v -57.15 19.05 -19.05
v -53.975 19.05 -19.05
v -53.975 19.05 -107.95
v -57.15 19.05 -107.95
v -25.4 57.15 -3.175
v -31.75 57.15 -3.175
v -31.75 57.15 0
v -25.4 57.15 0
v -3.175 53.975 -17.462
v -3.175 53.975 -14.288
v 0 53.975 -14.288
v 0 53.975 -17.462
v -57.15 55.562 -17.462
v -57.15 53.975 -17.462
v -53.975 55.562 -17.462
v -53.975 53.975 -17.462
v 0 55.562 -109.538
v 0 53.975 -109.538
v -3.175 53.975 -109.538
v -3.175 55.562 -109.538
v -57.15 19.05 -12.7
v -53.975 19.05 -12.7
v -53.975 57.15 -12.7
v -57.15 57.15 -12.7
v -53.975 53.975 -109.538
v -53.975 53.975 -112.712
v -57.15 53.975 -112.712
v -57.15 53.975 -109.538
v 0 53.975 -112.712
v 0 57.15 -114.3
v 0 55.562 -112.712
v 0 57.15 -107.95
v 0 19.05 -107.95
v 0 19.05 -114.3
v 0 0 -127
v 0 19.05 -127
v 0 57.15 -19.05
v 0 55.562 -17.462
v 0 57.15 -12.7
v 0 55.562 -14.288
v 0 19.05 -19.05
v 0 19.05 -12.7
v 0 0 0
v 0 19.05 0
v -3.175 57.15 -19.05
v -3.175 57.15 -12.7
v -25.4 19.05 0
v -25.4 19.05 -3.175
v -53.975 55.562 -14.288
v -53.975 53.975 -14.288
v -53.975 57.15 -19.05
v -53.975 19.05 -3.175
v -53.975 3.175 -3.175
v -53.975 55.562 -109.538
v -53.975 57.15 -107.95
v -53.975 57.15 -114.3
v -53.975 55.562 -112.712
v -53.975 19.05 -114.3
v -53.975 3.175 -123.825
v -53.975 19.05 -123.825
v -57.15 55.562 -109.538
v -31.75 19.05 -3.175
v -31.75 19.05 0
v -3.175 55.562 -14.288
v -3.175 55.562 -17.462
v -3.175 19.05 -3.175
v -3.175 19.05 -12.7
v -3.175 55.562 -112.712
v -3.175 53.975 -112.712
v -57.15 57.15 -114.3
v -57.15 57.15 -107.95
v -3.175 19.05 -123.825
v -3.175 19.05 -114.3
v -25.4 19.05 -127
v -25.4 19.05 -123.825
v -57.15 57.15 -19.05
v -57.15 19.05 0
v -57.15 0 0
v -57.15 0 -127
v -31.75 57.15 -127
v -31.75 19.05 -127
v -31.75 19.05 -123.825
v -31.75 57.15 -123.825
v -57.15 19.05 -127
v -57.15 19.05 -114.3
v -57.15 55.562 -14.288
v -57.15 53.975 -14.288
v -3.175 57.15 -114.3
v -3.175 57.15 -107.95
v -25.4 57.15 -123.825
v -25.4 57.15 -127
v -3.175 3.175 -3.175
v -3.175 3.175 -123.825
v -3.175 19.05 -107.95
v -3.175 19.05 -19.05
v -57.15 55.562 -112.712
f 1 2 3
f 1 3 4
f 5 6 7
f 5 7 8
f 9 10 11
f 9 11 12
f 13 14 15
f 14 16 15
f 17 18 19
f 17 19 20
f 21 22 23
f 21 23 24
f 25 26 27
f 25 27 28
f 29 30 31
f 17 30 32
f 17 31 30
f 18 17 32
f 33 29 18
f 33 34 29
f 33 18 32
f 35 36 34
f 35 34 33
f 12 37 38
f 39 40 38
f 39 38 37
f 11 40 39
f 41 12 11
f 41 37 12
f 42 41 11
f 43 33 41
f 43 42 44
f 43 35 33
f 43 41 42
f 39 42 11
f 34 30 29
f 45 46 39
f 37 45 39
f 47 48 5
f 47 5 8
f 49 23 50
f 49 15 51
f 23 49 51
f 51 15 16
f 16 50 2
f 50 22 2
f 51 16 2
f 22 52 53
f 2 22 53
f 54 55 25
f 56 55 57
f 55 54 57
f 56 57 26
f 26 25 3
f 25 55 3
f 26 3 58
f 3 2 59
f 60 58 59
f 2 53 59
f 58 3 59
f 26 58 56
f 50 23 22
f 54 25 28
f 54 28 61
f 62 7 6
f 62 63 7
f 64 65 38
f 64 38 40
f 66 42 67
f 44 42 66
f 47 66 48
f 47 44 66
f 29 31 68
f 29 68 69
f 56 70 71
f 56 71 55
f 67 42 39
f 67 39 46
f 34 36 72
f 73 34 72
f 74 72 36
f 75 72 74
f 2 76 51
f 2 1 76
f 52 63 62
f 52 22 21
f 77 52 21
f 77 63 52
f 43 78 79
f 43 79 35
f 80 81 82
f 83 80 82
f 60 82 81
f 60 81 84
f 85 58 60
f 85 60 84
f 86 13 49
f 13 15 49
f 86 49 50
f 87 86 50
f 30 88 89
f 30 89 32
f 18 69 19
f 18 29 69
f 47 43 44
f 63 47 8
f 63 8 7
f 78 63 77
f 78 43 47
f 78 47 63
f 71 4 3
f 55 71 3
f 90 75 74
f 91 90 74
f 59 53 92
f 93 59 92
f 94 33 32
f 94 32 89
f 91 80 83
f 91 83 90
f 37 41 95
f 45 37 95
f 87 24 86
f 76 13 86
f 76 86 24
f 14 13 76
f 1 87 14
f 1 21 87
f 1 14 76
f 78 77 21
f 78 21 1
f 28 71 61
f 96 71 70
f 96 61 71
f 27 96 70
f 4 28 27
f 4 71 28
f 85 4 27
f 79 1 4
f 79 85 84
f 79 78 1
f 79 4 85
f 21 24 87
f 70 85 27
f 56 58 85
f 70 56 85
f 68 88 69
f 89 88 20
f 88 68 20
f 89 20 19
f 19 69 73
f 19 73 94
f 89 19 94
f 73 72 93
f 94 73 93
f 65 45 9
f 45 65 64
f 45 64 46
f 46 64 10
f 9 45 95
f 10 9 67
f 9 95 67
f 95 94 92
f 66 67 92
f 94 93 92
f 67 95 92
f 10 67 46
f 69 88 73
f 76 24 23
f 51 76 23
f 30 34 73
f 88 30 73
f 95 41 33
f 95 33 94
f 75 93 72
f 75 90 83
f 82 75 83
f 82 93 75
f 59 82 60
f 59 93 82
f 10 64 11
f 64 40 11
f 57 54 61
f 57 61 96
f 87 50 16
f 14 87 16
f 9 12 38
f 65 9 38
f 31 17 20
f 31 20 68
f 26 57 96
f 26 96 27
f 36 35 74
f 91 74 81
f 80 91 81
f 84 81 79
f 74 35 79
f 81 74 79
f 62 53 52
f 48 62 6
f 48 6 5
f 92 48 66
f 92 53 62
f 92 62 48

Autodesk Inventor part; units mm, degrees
ref_plane "YZ Plane" through (0, 0, 0) normal (1, 0, 0) x (0, 1, 0)
ref_plane "XZ Plane" through (0, 0, 0) normal (0, 1, 0) x (-1, 0, 0)
ref_plane "XY Plane" through (0, 0, 0) normal (0, 0, 1) x (1, 0, 0)
sketch "Sketch1" plane through (0, 0, 0) normal (0, 1, 0) x (-1, 0, 0)
  line L0 (0, 0) -> (3.175, 0)
  line L1 (3.175, 0) -> (3.175, -3.175)
  line L2 (3.175, -3.175) -> (0, -3.175)
  line L3 (0, -3.175) -> (0, 0)
  line L4 (0, 0) -> (6.35, 0)
  line L5 (0, -6.35) -> (0, 0)
  line L6 (3.175, 0) -> (50.8, 0)
  line L7 (50.8, 0) -> (50.8, -3.175)
  line L8 (50.8, -3.175) -> (3.175, -3.175)
  line L9 (3.175, -3.175) -> (3.175, 0)
  line L10 (50.8, 0) -> (57.15, 0)
  line L11 (57.15, 0) -> (57.15, -6.35)
  line L12 (57.15, 0) -> (53.975, 0)
  line L13 (53.975, 0) -> (53.975, -3.175)
  line L14 (53.975, -3.175) -> (57.15, -3.175)
  line L15 (57.15, -3.175) -> (57.15, 0)
  line L16 (53.975, -120.65) -> (53.975, -123.825)
  line L17 (53.975, -123.825) -> (50.8, -123.825)
  line L18 (57.15, -120.65) -> (57.15, -127)
  line L19 (57.15, -127) -> (50.8, -127)
  line L20 (3.175, -120.65) -> (3.175, -123.825)
  line L21 (3.175, -123.825) -> (6.35, -123.825)
  line L22 (0, -120.65) -> (0, -127)
  line L23 (0, -127) -> (6.35, -127)
  line L24 (53.975, -127) -> (57.15, -127)
  line L25 (57.15, -127) -> (57.15, 0)
  line L26 (57.15, 0) -> (53.975, 0)
  line L27 (53.975, 0) -> (53.975, -127)
  line L28 (50.8, -3.175) -> (57.15, -3.175)
  line L29 (57.15, -3.175) -> (57.15, 0)
  line L30 (57.15, 0) -> (50.8, 0)
  line L31 (50.8, 0) -> (50.8, -3.175)
  line L32 (50.8, -127) -> (6.35, -127)
  line L33 (6.35, -127) -> (6.35, -123.825)
  line L34 (6.35, -123.825) -> (50.8, -123.825)
  line L35 (50.8, -123.825) -> (50.8, -127)
  line L36 (0, -120.65) -> (3.175, -120.65)
  line L37 (3.175, -120.65) -> (3.175, -6.35)
  line L38 (3.175, -6.35) -> (0, -6.35)
  line L39 (0, -6.35) -> (0, -120.65)
  line L40 (3.175, -6.35) -> (3.175, -3.175)
  line L41 (3.175, -3.175) -> (6.35, -3.175)
  line L42 (53.975, -123.825) -> (57.15, -123.825)
  line L43 (57.15, -123.825) -> (57.15, -120.65)
  line L44 (57.15, -120.65) -> (53.975, -120.65)
  line L45 (53.975, -120.65) -> (53.975, -123.825)
  line L46 (0, -127) -> (3.175, -127)
  line L47 (3.175, -127) -> (3.175, -123.825)
  line L48 (3.175, -123.825) -> (0, -123.825)
  line L49 (0, -123.825) -> (0, -127)
  line L50 (3.175, -3.175) -> (6.35, -3.175)
  line L51 (6.35, -3.175) -> (6.35, 0)
  line L52 (6.35, 0) -> (3.175, 0)
  line L53 (3.175, 0) -> (3.175, -3.175)
  line L54 (57.15, -3.175) -> (53.975, -3.175)
  line L55 (53.975, -3.175) -> (53.975, -6.35)
  line L56 (53.975, -6.35) -> (57.15, -6.35)
  line L57 (57.15, -6.35) -> (57.15, -3.175)
  line L58 (57.15, -6.35) -> (53.975, -6.35)
  line L59 (53.975, -6.35) -> (53.975, -120.65)
  line L60 (53.975, -120.65) -> (57.15, -120.65)
  line L61 (57.15, -120.65) -> (57.15, -6.35)
  line L62 (3.175, -3.175) -> (0, -3.175)
  line L63 (0, -3.175) -> (0, -6.35)
  line L64 (0, -6.35) -> (3.175, -6.35)
  line L65 (3.175, -6.35) -> (3.175, -3.175)
  line L66 (3.175, -123.825) -> (0, -123.825)
  line L67 (0, -123.825) -> (0, -120.65)
  line L68 (0, -120.65) -> (3.175, -120.65)
  line L69 (3.175, -120.65) -> (3.175, -123.825)
  line L70 (3.175, -123.825) -> (6.35, -123.825)
  line L71 (6.35, -123.825) -> (6.35, -127)
  line L72 (6.35, -127) -> (3.175, -127)
  line L73 (3.175, -127) -> (3.175, -123.825)
  line L74 (53.975, -123.825) -> (50.8, -123.825)
  line L75 (50.8, -123.825) -> (50.8, -127)
  line L76 (50.8, -127) -> (53.975, -127)
  line L77 (53.975, -127) -> (53.975, -123.825)
  line L78 (57.15, -120.65) -> (53.975, -120.65)
  line L79 (53.975, -120.65) -> (53.975, -123.825)
  line L80 (53.975, -123.825) -> (57.15, -123.825)
  line L81 (57.15, -123.825) -> (57.15, -120.65)
  dimension "d2" = 3.175
  dimension "d3" = 3.175
  dimension "d7" = 6.35
  dimension "d8" = 3.175
  dimension "d9" = 3.175
  dimension "d10" = 3.175
  dimension "d11" = 3.175
  dimension "d12" = 6.35
  dimension "d13" = 6.35
  dimension "d14" = 3.175
  dimension "d15" = 3.175
  dimension "d16" = 6.35
  dimension "d17" = 6.35
  dimension "d18" = 3.175
extrude "Extrusion1" add sketch "Sketch1" along normal blind 19.05 contours L0 L1 L2 L3 | L4 L51 L8 L1 | L2 L40 L38 L5 | L6 L7 L8 L51 | L38 L37 L36 L39 | L10 L13 L28 L7 | L36 L20 L48 L22 | L10 L11 L14 L13 | L48 L47 L23 L22 | L14 L11 L56 L27 | L21 L33 L23 L47 | L56 L25 L44 L27 | L34 L35 L32 L33 | L44 L18 L42 L16 | L17 L27 L19 L35 | L42 L18 L19 L27
sketch "Sketch2" plane through (0, 0, 0) normal (0, -1, 0) x (1, 0, 0)
  line L0 (-3.175, -3.175) -> (-53.975, -3.175) projected
  line L1 (-53.975, -123.825) -> (-3.175, -123.825)
  line L2 (-3.175, -123.825) -> (-3.175, -3.175)
  line L3 (-3.175, -3.175) -> (-53.975, -3.175)
  line L4 (-53.975, -3.175) -> (-53.975, -123.825)
  point P0 (0, 0)
extrude "Extrusion2" add sketch "Sketch2" against normal blind 3.175
sketch "Sketch3" plane through (0, 19.05, 0) normal (0, 1, 0) x (1, 0, 0)
  line L0 (0, 127) -> (-57.15, 127) projected
  line L1 (-57.15, 0) -> (0, 0) projected
  line L2 (-3.175, 123.825) -> (-53.975, 123.825) projected
  line L3 (-57.15, 127) -> (-57.15, 0) projected
  line L4 (-3.175, 3.175) -> (-53.975, 3.175) projected
  line L5 (-3.175, 123.825) -> (-3.175, 3.175) projected
  line L6 (-53.975, 3.175) -> (-53.975, 123.825) projected
  line L7 (0, 0) -> (0, 127) projected
  line L8 (0, 114.3) -> (-3.175, 114.3)
  line L9 (-3.175, 114.3) -> (0, 114.3)
  line L10 (0, 114.3) -> (0, 107.95)
  line L11 (0, 107.95) -> (-3.175, 107.95)
  line L12 (-3.175, 107.95) -> (-3.175, 114.3)
  line L13 (0, 0) -> (0, 12.7)
  line L14 (0, 12.7) -> (-3.175, 12.7)
  line L15 (-3.175, 12.7) -> (0, 12.7)
  line L16 (0, 12.7) -> (0, 19.05)
  line L17 (0, 19.05) -> (-3.175, 19.05)
  line L18 (-3.175, 19.05) -> (-3.175, 12.7)
  line L19 (-53.975, 12.7) -> (-57.15, 12.7)
  line L20 (-57.15, 12.7) -> (-57.15, 19.05)
  line L21 (-57.15, 19.05) -> (-53.975, 19.05)
  line L22 (-53.975, 19.05) -> (-53.975, 12.7)
  line L23 (-53.975, 114.3) -> (-57.15, 114.3)
  line L24 (-57.15, 114.3) -> (-57.15, 107.95)
  line L25 (-57.15, 107.95) -> (-53.975, 107.95)
  line L26 (-53.975, 107.95) -> (-53.975, 114.3)
  line L27 (-31.75, 123.825) -> (-25.4, 123.825)
  line L28 (-25.4, 123.825) -> (-25.4, 127)
  line L29 (-25.4, 127) -> (-31.75, 127)
  line L30 (-31.75, 127) -> (-31.75, 123.825)
  line L31 (-31.75, 123.825) -> (-25.4, 127) construction
  line L32 (-25.4, 123.825) -> (-31.75, 127) construction
  line L33 (-31.75, 3.175) -> (-25.4, 3.175)
  line L34 (-25.4, 3.175) -> (-25.4, 0)
  line L35 (-25.4, 0) -> (-31.75, 0)
  line L36 (-31.75, 0) -> (-31.75, 3.175)
  line L37 (-31.75, 3.175) -> (-25.4, 0) construction
  line L38 (-25.4, 3.175) -> (-31.75, 0) construction
  point P0 (-28.575, 125.4125)
  point P1 (-28.575, 1.5875)
  dimension "d23" = 127
  dimension "d24" = 57.15
  dimension "d45" = 6.35
  dimension "d46" = 3.175
  dimension "d49" = 3.175
  dimension "d50" = 6.35
  dimension "d51" = 6.35
  dimension "d52" = 6.35
  dimension "d53" = 6.35
  dimension "d54" = 3.175
  dimension "d55" = 0
  dimension "d56" = 28.575
  dimension "d57" = 6.35
  dimension "d58" = 3.175
  dimension "d59" = 0
  dimension "d60" = 28.575
  dimension "d71" = 12.7
  dimension "d72" = 12.7
  dimension "d73" = 12.7
  dimension "d74" = 12.7
extrude "Extrusion3" add sketch "Sketch3" along normal blind 38.1 contours L28 L2 L30 L0 | L7 L11 L5 L8 | L7 L14 L5 L17 | L23 L6 L25 L3 | L21 L6 L19 L3 | L1 L36 L4 L34
sketch "Sketch5" plane through (0, 0, 0) normal (1, 0, 0) x (0, 0, -1)
  line L0 (114.3, 19.05) -> (114.3, 57.15) projected
  line L1 (107.95, 19.05) -> (107.95, 57.15) projected
  line L2 (109.5375, 55.5625) -> (112.7125, 55.5625)
  line L3 (112.7125, 55.5625) -> (112.7125, 53.975)
  line L4 (112.7125, 53.975) -> (109.5375, 53.975)
  line L5 (109.5375, 53.975) -> (109.5375, 55.5625)
  line L6 (107.95, 57.15) -> (114.3, 57.15) projected
  line L7 (14.2875, 53.975) -> (17.4625, 53.975)
  line L8 (17.4625, 53.975) -> (17.4625, 55.5625)
  line L9 (17.4625, 55.5625) -> (14.2875, 55.5625)
  line L10 (14.2875, 55.5625) -> (14.2875, 53.975)
  line L11 (12.7, 19.05) -> (12.7, 57.15) projected
  line L12 (12.7, 57.15) -> (19.05, 57.15) projected
  point P0 (0, 0)
  dimension "d61" = 6.35
  dimension "d62" = 3.175
  dimension "d63" = 1.5875
  dimension "d64" = 1.5875
  dimension "d66" = 1.5875
  dimension "d67" = 3.175
  dimension "d68" = 1.5875
  dimension "d88" = 1.5875
  dimension "d89" = 1.5875
extrude "Extrusion4" cut sketch "Sketch5" against normal blind 25374.6
